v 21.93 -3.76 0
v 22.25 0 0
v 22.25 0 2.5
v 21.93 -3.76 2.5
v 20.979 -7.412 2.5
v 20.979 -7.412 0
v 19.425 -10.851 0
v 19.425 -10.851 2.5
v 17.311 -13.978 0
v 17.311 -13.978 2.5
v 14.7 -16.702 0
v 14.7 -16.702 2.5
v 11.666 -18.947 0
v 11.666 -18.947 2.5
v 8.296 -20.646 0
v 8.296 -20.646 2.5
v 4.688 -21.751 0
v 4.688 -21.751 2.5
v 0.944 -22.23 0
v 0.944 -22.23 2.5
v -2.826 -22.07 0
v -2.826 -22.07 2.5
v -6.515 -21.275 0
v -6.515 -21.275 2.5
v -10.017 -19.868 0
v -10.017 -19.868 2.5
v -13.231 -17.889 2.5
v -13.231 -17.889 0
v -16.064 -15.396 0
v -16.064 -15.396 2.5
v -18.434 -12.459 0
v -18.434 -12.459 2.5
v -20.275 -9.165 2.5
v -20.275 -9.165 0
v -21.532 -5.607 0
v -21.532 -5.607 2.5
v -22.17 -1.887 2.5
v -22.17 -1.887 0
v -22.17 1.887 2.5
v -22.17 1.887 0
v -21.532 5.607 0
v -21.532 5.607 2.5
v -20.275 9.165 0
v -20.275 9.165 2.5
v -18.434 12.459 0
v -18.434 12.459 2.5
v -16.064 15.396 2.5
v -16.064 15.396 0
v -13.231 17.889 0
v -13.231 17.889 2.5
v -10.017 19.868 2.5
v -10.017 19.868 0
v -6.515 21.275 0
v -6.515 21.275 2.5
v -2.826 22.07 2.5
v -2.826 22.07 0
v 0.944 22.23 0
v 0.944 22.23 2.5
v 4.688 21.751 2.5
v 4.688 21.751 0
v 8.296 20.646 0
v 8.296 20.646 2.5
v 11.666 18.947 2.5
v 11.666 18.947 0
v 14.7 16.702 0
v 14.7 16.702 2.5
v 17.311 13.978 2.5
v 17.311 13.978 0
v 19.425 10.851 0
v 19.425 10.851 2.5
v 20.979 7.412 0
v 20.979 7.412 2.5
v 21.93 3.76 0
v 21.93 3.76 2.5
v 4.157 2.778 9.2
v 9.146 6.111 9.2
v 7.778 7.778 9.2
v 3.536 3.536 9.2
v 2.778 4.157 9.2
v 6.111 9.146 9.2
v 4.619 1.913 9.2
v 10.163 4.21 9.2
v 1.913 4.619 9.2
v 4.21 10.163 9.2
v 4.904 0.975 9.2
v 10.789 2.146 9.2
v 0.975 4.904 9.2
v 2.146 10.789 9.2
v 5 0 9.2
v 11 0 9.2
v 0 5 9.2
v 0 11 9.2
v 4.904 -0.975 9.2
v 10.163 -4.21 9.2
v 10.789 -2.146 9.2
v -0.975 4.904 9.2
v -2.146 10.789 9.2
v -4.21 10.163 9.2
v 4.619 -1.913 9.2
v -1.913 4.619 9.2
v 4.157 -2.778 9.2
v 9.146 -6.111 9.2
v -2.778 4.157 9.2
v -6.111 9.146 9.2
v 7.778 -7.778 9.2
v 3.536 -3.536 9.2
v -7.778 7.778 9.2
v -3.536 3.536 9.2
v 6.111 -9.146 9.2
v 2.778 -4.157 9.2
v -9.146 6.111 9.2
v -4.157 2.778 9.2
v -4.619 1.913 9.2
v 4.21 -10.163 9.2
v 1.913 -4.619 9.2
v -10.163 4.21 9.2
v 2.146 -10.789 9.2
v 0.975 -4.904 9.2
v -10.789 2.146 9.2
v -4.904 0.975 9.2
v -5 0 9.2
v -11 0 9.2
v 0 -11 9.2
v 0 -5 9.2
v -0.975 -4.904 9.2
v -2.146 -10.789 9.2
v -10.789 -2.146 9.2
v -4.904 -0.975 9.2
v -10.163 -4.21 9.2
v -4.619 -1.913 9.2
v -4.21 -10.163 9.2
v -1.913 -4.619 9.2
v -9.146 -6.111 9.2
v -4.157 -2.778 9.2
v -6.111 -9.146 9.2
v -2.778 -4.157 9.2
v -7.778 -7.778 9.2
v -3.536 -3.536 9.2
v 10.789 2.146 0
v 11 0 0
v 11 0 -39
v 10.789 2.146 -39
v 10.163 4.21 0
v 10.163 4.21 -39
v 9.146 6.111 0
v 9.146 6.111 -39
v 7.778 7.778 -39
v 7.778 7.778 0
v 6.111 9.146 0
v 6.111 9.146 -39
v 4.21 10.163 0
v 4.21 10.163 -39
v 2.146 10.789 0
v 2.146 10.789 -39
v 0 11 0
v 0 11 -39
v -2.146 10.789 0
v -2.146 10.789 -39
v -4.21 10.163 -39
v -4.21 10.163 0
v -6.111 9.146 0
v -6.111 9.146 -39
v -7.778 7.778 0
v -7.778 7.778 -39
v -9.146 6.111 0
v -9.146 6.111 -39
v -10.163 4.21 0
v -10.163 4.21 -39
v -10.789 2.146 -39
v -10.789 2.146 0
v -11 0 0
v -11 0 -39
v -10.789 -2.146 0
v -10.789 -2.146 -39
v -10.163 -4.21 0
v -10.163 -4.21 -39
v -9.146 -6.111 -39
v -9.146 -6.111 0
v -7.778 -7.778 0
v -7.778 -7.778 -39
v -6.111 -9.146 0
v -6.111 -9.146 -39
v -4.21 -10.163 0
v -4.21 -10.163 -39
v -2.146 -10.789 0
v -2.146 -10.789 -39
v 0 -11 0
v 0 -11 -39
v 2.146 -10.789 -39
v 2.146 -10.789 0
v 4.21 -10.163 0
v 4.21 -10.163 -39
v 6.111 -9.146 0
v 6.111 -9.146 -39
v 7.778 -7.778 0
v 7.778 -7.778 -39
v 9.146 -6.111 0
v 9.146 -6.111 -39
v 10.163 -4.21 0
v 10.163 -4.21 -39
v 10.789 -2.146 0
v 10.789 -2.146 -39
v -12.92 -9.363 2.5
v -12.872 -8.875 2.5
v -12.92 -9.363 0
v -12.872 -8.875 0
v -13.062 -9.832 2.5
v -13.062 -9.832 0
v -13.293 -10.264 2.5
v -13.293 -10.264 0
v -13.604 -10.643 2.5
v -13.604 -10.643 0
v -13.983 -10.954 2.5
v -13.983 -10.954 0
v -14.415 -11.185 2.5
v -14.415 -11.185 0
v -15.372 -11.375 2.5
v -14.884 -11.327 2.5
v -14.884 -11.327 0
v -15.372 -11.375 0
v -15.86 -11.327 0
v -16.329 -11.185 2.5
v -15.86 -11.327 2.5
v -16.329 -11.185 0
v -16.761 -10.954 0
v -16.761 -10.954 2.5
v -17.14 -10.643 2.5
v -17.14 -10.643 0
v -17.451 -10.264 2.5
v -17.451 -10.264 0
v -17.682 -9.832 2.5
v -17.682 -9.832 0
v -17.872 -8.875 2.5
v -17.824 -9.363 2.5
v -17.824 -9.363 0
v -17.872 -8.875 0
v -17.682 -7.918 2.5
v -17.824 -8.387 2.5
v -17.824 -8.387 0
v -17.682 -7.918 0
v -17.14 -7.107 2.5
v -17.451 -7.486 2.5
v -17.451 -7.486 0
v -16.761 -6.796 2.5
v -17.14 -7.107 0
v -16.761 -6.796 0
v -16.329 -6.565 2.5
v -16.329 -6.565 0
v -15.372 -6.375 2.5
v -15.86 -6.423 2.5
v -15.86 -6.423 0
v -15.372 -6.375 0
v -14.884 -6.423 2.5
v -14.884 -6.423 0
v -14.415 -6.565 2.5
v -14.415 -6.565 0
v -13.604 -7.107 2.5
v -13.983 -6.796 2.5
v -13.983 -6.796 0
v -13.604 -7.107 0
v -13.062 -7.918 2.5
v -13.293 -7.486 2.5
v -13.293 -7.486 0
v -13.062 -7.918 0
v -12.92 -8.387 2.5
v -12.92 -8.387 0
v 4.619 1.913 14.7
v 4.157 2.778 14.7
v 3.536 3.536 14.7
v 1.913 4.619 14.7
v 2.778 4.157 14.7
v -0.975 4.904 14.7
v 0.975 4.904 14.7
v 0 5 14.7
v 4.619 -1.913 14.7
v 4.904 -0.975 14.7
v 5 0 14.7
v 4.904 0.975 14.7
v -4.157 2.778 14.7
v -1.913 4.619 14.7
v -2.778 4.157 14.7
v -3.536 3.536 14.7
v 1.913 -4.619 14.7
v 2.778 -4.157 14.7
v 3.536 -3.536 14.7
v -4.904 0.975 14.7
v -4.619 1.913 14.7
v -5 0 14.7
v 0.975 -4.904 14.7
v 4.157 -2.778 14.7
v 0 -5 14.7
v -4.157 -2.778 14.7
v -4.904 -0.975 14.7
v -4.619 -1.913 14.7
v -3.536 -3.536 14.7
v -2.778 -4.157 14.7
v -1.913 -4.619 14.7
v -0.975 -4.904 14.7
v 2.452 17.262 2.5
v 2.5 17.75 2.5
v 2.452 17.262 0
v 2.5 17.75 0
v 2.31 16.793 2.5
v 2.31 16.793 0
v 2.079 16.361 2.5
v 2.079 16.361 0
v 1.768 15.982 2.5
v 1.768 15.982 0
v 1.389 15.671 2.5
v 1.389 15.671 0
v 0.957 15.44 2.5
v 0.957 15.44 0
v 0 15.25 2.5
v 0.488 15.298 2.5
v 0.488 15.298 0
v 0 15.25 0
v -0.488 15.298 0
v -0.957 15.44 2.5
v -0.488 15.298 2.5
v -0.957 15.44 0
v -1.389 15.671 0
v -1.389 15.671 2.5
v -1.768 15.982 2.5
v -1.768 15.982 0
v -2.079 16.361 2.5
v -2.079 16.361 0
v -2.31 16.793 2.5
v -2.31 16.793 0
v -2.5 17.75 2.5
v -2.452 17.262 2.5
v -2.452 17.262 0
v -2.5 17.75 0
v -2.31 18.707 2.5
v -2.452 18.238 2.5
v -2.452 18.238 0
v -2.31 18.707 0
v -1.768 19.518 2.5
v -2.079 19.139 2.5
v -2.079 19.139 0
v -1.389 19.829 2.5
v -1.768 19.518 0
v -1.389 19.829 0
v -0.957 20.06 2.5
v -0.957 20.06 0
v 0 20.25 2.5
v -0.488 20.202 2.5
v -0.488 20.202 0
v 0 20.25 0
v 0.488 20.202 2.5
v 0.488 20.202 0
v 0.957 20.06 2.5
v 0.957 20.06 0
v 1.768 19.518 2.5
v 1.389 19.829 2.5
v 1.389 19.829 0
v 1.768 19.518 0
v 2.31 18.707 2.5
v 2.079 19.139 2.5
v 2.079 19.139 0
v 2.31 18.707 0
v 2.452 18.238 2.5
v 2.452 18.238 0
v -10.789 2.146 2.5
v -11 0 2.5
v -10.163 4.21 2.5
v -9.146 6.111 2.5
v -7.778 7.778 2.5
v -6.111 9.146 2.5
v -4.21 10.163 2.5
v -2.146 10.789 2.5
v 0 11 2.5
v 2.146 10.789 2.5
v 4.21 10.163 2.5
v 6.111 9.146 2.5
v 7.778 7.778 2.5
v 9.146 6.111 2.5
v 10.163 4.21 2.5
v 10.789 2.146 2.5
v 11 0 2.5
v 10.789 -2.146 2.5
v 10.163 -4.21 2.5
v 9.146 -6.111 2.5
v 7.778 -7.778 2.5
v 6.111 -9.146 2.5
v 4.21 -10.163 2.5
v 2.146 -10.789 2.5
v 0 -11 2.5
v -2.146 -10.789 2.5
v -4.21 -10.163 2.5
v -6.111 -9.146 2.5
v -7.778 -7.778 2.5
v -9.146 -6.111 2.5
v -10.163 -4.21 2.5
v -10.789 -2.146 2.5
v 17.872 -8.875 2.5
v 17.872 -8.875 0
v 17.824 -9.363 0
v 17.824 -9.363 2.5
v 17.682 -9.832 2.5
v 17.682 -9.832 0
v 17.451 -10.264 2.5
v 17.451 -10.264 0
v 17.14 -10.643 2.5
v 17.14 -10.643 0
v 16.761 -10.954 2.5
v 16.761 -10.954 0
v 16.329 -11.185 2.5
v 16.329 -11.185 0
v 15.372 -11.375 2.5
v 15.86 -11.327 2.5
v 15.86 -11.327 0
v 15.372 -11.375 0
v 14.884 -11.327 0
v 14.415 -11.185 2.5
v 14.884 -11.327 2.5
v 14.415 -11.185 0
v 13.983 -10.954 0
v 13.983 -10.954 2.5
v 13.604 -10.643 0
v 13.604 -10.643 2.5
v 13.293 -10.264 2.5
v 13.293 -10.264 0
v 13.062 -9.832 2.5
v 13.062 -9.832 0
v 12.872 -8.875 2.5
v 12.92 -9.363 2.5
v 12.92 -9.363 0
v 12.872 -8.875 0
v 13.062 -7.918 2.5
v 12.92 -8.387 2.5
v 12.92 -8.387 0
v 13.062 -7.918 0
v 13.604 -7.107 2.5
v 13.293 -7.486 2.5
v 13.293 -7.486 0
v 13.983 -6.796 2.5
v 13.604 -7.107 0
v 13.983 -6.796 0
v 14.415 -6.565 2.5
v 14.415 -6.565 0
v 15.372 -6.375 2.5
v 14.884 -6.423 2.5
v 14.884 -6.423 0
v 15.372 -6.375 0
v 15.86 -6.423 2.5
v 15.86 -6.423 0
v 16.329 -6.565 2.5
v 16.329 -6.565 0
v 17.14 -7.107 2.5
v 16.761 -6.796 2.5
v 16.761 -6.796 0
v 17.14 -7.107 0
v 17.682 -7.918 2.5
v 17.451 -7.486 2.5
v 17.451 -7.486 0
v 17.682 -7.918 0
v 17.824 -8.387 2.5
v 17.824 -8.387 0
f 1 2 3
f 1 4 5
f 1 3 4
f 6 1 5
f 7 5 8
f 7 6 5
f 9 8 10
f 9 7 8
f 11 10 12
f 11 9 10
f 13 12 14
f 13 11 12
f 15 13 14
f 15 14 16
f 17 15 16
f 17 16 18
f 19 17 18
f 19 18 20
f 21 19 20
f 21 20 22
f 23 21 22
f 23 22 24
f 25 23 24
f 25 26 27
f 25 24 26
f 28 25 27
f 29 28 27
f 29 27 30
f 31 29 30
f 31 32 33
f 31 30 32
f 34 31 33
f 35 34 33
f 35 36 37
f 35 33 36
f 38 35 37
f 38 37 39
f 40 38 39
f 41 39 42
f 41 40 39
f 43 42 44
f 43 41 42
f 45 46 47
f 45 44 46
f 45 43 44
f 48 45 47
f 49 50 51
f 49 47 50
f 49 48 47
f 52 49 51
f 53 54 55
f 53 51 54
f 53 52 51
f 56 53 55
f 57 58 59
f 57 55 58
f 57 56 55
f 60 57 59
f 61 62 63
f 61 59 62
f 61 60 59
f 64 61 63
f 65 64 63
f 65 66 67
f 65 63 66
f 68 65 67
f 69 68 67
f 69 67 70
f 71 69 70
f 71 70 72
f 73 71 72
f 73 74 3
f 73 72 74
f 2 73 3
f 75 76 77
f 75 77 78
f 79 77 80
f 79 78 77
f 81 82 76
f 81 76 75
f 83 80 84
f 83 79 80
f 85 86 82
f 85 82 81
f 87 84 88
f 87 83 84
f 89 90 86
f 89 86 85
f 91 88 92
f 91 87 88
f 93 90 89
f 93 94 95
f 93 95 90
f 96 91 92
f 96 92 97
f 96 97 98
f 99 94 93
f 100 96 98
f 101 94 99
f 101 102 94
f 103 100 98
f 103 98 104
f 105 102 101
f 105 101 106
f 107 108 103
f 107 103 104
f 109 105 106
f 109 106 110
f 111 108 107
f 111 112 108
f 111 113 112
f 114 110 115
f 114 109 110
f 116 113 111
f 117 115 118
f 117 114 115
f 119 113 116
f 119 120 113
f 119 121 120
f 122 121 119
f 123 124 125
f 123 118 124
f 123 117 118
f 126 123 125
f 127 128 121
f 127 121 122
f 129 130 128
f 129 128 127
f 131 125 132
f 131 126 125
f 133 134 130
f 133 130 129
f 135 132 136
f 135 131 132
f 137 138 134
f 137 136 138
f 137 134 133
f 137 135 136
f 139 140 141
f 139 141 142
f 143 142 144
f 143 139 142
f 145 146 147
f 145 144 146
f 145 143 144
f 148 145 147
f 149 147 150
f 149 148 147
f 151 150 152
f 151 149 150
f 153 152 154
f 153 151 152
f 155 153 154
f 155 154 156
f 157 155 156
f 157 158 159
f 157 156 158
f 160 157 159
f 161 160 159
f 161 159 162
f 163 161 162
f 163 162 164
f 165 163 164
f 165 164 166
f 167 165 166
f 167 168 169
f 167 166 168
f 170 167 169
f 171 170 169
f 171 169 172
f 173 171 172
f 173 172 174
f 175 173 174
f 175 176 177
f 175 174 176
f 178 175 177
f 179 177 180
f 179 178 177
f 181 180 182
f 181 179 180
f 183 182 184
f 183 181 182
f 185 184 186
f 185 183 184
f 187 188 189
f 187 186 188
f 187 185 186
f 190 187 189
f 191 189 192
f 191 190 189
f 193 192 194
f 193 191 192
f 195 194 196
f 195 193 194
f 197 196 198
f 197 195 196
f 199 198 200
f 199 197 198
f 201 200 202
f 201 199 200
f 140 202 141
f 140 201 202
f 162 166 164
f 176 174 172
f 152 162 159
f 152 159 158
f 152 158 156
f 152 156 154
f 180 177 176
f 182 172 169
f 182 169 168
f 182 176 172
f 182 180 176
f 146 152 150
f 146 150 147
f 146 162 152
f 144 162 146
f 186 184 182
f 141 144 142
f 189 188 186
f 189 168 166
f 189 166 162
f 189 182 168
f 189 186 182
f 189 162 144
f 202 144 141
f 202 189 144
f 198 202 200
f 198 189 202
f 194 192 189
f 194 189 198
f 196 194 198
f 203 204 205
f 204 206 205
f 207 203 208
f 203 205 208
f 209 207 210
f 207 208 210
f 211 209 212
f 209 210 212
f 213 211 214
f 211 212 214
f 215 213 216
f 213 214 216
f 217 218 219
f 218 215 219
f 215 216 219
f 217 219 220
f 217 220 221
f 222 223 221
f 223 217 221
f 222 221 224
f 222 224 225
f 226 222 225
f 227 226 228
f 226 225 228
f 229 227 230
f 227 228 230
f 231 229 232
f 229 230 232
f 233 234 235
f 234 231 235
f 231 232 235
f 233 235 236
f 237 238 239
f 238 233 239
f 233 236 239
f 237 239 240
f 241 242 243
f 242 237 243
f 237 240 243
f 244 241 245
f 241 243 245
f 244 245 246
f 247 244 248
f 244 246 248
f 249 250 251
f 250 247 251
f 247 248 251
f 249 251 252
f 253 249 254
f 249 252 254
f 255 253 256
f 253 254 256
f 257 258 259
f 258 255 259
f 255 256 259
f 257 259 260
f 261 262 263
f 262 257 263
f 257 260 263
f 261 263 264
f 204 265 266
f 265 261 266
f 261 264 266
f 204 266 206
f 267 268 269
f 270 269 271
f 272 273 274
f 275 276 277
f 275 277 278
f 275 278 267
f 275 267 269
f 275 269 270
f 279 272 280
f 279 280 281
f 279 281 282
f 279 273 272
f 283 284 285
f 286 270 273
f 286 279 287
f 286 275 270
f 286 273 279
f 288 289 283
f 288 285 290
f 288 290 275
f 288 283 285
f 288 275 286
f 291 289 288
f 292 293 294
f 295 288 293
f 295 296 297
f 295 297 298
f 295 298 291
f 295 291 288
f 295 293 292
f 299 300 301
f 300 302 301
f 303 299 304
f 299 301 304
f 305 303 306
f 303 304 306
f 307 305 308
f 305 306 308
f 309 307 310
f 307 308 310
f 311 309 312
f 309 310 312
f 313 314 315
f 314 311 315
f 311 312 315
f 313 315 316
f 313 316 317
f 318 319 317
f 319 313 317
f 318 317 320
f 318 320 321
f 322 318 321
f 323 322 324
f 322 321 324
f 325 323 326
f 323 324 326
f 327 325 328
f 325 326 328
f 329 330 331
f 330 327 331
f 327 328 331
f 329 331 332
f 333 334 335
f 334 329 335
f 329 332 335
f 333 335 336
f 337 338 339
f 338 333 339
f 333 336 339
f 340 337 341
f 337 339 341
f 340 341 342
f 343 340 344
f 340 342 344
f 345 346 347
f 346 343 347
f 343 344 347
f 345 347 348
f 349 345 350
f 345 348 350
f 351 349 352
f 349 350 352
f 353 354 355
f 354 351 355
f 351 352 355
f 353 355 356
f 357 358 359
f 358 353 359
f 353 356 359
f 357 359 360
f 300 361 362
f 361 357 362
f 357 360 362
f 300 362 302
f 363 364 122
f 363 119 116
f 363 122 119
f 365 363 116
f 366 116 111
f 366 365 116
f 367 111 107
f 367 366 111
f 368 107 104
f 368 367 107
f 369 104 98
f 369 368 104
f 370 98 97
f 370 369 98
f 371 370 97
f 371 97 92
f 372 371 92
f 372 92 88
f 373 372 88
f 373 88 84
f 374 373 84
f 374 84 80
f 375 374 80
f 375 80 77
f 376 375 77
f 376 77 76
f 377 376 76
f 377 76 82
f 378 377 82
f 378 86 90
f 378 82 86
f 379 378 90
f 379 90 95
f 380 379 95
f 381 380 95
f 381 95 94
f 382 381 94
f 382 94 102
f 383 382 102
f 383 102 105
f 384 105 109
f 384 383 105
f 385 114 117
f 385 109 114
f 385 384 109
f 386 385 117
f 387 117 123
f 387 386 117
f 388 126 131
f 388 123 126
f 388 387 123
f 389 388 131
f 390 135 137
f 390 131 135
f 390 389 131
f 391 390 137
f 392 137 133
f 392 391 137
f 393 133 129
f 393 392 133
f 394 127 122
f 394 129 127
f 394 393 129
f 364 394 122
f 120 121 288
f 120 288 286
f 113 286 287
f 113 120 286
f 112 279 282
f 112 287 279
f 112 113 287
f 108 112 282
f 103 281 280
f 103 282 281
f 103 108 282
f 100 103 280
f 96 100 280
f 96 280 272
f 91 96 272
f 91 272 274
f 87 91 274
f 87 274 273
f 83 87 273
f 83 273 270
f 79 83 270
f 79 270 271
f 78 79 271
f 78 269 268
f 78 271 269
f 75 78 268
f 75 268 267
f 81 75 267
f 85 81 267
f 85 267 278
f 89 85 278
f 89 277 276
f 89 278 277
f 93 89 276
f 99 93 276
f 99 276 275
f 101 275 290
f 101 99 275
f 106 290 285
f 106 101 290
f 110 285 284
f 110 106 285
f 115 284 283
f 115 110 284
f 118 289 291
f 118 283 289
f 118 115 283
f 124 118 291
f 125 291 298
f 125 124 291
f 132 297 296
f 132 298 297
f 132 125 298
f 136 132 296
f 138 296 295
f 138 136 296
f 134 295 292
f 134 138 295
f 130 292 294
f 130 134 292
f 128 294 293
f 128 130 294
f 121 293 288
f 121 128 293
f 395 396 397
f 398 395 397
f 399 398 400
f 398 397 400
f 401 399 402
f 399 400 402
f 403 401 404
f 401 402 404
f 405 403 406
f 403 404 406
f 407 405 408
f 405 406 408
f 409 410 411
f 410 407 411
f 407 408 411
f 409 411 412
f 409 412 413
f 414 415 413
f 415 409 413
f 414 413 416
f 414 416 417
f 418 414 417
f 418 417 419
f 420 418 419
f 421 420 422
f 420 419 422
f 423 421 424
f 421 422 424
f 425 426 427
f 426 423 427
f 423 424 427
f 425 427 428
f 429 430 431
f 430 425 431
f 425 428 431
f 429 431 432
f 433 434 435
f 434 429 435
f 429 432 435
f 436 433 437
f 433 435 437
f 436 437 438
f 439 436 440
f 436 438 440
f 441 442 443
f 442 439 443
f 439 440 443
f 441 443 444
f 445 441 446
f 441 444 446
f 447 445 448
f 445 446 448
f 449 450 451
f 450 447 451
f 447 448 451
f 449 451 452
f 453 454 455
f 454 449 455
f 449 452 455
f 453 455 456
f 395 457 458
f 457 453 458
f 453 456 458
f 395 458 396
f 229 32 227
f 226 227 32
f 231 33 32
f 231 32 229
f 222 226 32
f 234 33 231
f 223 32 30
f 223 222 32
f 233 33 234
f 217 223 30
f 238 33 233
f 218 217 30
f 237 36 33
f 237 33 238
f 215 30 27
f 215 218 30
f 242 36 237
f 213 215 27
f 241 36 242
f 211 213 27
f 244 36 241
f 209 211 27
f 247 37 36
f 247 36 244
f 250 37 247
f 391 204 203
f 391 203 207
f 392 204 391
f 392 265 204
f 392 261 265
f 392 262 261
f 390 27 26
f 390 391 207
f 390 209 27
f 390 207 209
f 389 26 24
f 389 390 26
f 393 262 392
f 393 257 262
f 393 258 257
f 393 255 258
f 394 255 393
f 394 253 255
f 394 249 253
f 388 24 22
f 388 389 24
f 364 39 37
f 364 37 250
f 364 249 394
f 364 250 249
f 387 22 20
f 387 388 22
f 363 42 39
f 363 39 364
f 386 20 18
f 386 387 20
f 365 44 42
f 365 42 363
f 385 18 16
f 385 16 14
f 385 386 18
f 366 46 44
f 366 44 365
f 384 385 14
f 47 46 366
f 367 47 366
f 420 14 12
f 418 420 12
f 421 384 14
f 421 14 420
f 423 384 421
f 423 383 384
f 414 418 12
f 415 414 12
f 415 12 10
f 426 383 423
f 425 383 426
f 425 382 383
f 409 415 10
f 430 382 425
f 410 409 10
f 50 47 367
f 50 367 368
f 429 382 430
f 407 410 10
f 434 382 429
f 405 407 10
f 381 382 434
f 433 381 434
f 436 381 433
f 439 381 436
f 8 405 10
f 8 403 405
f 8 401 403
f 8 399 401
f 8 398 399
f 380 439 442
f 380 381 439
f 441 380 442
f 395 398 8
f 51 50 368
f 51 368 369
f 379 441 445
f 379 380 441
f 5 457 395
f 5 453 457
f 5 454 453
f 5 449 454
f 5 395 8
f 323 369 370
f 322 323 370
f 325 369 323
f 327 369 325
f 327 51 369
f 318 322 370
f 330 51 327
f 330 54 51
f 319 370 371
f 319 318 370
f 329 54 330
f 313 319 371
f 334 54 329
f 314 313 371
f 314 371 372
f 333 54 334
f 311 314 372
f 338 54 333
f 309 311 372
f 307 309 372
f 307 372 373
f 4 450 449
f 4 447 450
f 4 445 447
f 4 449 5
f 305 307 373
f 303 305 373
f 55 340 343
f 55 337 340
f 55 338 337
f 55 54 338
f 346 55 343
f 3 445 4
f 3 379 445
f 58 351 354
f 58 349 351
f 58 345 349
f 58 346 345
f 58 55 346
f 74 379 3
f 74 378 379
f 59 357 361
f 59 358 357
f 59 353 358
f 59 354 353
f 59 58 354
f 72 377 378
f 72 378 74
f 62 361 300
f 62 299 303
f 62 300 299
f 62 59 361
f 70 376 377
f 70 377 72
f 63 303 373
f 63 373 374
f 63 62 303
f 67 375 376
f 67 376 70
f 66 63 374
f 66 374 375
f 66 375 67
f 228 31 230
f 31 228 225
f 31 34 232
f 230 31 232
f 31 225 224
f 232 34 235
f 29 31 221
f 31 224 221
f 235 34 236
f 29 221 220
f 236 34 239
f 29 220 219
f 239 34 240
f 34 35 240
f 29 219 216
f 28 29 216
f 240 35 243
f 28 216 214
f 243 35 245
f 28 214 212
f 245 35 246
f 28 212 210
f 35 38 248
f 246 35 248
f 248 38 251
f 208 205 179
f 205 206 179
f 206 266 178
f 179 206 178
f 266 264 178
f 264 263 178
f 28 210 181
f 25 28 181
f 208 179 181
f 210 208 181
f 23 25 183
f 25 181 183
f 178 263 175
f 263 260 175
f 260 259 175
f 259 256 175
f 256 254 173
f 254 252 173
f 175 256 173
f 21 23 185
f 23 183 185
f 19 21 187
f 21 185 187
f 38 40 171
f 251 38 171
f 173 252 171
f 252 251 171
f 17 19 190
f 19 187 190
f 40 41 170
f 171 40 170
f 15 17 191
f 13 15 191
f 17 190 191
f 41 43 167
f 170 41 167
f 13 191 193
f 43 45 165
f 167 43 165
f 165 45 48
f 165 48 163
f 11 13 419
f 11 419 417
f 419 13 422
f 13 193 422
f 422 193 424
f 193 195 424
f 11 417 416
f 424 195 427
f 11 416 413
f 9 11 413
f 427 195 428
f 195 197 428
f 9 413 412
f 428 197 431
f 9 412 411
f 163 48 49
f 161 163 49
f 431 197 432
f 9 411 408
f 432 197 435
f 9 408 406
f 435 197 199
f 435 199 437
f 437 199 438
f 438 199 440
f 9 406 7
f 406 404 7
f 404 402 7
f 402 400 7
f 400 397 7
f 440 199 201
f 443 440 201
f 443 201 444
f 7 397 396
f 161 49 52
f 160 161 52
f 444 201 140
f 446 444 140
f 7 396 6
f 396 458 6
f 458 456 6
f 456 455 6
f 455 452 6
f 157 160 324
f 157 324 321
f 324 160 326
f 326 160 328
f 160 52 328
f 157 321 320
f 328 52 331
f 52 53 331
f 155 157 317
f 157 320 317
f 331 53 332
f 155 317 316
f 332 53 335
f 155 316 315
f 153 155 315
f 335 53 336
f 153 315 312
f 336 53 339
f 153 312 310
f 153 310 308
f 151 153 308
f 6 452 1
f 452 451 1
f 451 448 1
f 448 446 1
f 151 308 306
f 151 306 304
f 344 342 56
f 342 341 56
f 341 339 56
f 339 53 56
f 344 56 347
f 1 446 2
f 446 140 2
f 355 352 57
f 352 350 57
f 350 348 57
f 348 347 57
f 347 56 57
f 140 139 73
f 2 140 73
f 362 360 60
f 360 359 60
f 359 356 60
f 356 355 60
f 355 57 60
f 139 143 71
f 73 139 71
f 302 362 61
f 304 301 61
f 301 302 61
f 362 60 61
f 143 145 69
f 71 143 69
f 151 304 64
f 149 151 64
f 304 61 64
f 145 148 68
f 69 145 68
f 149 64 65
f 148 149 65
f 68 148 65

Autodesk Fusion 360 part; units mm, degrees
sketch "Sketch1" plane through (0, 0, 0) normal (0, 0, 1) x (1, 0, 0)
  circle A0 centre (0, 0) radius 22.25
  line L0 (0, 0) -> (0, 22.25) construction
  circle A1 centre (0, 17.75) radius 2.5
  line L1 (0, 17.75) -> (0, 20.25) construction
  circle A2 centre (-15.372, -8.875) radius 2.5
  circle A3 centre (15.372, -8.875) radius 2.5
  circle A4 centre (0, 0) radius 17.75 construction
  dimension "d1" = 44.5
  dimension "d2" = 5
  dimension "d3" = 2
  dimension "d5" = 360
extrude "Extrude1" add sketch "Sketch1" along normal blind 2.5 makes body 1
sketch "Sketch2" plane through (0, 0, 2.5) normal (0, 0, 1) x (-1, 0, 0)
  circle A0 centre (0, -17.75) radius 2.5
  circle A1 centre (15.372, 8.875) radius 2.5
  circle A2 centre (-15.372, 8.875) radius 2.5
  circle A3 centre (0, 0) radius 22.25
  circle A4 centre (0, 0) radius 11
  dimension "d8" = 22
extrude "Extrude2" add sketch "Sketch2" along normal blind 6.7 contours A4 bodies 1
sketch "Sketch3" plane through (0, 0, 9.2) normal (0, 0, 1) x (-1, 0, 0)
  circle A0 centre (0, 0) radius 11
  circle A1 centre (0, 0) radius 5
  dimension "d11" = 10
extrude "Extrude3" add sketch "Sketch3" along normal blind 5.5 contours A1 bodies 1
sketch "Sketch4" plane through (0, 0, 0) normal (0, 0, -1) x (1, 0, 0)
  circle A0 centre (0, -17.75) radius 2.5
  circle A1 centre (-15.372, 8.875) radius 2.5
  circle A2 centre (15.372, 8.875) radius 2.5
  circle A3 centre (0, 0) radius 22.25
  circle A4 centre (0, 0) radius 11
  dimension "d14" = 22
extrude "Extrude4" add sketch "Sketch4" along normal blind 39 contours A4 bodies 1
copy_body "Body->Comp1" bodies 1 removing the originals makes body 2 in component "Component"
component "Component" placed x (1, 0, 0) y (0, 1, 0) z (0, 0, 1) at (0, 0, 0)
